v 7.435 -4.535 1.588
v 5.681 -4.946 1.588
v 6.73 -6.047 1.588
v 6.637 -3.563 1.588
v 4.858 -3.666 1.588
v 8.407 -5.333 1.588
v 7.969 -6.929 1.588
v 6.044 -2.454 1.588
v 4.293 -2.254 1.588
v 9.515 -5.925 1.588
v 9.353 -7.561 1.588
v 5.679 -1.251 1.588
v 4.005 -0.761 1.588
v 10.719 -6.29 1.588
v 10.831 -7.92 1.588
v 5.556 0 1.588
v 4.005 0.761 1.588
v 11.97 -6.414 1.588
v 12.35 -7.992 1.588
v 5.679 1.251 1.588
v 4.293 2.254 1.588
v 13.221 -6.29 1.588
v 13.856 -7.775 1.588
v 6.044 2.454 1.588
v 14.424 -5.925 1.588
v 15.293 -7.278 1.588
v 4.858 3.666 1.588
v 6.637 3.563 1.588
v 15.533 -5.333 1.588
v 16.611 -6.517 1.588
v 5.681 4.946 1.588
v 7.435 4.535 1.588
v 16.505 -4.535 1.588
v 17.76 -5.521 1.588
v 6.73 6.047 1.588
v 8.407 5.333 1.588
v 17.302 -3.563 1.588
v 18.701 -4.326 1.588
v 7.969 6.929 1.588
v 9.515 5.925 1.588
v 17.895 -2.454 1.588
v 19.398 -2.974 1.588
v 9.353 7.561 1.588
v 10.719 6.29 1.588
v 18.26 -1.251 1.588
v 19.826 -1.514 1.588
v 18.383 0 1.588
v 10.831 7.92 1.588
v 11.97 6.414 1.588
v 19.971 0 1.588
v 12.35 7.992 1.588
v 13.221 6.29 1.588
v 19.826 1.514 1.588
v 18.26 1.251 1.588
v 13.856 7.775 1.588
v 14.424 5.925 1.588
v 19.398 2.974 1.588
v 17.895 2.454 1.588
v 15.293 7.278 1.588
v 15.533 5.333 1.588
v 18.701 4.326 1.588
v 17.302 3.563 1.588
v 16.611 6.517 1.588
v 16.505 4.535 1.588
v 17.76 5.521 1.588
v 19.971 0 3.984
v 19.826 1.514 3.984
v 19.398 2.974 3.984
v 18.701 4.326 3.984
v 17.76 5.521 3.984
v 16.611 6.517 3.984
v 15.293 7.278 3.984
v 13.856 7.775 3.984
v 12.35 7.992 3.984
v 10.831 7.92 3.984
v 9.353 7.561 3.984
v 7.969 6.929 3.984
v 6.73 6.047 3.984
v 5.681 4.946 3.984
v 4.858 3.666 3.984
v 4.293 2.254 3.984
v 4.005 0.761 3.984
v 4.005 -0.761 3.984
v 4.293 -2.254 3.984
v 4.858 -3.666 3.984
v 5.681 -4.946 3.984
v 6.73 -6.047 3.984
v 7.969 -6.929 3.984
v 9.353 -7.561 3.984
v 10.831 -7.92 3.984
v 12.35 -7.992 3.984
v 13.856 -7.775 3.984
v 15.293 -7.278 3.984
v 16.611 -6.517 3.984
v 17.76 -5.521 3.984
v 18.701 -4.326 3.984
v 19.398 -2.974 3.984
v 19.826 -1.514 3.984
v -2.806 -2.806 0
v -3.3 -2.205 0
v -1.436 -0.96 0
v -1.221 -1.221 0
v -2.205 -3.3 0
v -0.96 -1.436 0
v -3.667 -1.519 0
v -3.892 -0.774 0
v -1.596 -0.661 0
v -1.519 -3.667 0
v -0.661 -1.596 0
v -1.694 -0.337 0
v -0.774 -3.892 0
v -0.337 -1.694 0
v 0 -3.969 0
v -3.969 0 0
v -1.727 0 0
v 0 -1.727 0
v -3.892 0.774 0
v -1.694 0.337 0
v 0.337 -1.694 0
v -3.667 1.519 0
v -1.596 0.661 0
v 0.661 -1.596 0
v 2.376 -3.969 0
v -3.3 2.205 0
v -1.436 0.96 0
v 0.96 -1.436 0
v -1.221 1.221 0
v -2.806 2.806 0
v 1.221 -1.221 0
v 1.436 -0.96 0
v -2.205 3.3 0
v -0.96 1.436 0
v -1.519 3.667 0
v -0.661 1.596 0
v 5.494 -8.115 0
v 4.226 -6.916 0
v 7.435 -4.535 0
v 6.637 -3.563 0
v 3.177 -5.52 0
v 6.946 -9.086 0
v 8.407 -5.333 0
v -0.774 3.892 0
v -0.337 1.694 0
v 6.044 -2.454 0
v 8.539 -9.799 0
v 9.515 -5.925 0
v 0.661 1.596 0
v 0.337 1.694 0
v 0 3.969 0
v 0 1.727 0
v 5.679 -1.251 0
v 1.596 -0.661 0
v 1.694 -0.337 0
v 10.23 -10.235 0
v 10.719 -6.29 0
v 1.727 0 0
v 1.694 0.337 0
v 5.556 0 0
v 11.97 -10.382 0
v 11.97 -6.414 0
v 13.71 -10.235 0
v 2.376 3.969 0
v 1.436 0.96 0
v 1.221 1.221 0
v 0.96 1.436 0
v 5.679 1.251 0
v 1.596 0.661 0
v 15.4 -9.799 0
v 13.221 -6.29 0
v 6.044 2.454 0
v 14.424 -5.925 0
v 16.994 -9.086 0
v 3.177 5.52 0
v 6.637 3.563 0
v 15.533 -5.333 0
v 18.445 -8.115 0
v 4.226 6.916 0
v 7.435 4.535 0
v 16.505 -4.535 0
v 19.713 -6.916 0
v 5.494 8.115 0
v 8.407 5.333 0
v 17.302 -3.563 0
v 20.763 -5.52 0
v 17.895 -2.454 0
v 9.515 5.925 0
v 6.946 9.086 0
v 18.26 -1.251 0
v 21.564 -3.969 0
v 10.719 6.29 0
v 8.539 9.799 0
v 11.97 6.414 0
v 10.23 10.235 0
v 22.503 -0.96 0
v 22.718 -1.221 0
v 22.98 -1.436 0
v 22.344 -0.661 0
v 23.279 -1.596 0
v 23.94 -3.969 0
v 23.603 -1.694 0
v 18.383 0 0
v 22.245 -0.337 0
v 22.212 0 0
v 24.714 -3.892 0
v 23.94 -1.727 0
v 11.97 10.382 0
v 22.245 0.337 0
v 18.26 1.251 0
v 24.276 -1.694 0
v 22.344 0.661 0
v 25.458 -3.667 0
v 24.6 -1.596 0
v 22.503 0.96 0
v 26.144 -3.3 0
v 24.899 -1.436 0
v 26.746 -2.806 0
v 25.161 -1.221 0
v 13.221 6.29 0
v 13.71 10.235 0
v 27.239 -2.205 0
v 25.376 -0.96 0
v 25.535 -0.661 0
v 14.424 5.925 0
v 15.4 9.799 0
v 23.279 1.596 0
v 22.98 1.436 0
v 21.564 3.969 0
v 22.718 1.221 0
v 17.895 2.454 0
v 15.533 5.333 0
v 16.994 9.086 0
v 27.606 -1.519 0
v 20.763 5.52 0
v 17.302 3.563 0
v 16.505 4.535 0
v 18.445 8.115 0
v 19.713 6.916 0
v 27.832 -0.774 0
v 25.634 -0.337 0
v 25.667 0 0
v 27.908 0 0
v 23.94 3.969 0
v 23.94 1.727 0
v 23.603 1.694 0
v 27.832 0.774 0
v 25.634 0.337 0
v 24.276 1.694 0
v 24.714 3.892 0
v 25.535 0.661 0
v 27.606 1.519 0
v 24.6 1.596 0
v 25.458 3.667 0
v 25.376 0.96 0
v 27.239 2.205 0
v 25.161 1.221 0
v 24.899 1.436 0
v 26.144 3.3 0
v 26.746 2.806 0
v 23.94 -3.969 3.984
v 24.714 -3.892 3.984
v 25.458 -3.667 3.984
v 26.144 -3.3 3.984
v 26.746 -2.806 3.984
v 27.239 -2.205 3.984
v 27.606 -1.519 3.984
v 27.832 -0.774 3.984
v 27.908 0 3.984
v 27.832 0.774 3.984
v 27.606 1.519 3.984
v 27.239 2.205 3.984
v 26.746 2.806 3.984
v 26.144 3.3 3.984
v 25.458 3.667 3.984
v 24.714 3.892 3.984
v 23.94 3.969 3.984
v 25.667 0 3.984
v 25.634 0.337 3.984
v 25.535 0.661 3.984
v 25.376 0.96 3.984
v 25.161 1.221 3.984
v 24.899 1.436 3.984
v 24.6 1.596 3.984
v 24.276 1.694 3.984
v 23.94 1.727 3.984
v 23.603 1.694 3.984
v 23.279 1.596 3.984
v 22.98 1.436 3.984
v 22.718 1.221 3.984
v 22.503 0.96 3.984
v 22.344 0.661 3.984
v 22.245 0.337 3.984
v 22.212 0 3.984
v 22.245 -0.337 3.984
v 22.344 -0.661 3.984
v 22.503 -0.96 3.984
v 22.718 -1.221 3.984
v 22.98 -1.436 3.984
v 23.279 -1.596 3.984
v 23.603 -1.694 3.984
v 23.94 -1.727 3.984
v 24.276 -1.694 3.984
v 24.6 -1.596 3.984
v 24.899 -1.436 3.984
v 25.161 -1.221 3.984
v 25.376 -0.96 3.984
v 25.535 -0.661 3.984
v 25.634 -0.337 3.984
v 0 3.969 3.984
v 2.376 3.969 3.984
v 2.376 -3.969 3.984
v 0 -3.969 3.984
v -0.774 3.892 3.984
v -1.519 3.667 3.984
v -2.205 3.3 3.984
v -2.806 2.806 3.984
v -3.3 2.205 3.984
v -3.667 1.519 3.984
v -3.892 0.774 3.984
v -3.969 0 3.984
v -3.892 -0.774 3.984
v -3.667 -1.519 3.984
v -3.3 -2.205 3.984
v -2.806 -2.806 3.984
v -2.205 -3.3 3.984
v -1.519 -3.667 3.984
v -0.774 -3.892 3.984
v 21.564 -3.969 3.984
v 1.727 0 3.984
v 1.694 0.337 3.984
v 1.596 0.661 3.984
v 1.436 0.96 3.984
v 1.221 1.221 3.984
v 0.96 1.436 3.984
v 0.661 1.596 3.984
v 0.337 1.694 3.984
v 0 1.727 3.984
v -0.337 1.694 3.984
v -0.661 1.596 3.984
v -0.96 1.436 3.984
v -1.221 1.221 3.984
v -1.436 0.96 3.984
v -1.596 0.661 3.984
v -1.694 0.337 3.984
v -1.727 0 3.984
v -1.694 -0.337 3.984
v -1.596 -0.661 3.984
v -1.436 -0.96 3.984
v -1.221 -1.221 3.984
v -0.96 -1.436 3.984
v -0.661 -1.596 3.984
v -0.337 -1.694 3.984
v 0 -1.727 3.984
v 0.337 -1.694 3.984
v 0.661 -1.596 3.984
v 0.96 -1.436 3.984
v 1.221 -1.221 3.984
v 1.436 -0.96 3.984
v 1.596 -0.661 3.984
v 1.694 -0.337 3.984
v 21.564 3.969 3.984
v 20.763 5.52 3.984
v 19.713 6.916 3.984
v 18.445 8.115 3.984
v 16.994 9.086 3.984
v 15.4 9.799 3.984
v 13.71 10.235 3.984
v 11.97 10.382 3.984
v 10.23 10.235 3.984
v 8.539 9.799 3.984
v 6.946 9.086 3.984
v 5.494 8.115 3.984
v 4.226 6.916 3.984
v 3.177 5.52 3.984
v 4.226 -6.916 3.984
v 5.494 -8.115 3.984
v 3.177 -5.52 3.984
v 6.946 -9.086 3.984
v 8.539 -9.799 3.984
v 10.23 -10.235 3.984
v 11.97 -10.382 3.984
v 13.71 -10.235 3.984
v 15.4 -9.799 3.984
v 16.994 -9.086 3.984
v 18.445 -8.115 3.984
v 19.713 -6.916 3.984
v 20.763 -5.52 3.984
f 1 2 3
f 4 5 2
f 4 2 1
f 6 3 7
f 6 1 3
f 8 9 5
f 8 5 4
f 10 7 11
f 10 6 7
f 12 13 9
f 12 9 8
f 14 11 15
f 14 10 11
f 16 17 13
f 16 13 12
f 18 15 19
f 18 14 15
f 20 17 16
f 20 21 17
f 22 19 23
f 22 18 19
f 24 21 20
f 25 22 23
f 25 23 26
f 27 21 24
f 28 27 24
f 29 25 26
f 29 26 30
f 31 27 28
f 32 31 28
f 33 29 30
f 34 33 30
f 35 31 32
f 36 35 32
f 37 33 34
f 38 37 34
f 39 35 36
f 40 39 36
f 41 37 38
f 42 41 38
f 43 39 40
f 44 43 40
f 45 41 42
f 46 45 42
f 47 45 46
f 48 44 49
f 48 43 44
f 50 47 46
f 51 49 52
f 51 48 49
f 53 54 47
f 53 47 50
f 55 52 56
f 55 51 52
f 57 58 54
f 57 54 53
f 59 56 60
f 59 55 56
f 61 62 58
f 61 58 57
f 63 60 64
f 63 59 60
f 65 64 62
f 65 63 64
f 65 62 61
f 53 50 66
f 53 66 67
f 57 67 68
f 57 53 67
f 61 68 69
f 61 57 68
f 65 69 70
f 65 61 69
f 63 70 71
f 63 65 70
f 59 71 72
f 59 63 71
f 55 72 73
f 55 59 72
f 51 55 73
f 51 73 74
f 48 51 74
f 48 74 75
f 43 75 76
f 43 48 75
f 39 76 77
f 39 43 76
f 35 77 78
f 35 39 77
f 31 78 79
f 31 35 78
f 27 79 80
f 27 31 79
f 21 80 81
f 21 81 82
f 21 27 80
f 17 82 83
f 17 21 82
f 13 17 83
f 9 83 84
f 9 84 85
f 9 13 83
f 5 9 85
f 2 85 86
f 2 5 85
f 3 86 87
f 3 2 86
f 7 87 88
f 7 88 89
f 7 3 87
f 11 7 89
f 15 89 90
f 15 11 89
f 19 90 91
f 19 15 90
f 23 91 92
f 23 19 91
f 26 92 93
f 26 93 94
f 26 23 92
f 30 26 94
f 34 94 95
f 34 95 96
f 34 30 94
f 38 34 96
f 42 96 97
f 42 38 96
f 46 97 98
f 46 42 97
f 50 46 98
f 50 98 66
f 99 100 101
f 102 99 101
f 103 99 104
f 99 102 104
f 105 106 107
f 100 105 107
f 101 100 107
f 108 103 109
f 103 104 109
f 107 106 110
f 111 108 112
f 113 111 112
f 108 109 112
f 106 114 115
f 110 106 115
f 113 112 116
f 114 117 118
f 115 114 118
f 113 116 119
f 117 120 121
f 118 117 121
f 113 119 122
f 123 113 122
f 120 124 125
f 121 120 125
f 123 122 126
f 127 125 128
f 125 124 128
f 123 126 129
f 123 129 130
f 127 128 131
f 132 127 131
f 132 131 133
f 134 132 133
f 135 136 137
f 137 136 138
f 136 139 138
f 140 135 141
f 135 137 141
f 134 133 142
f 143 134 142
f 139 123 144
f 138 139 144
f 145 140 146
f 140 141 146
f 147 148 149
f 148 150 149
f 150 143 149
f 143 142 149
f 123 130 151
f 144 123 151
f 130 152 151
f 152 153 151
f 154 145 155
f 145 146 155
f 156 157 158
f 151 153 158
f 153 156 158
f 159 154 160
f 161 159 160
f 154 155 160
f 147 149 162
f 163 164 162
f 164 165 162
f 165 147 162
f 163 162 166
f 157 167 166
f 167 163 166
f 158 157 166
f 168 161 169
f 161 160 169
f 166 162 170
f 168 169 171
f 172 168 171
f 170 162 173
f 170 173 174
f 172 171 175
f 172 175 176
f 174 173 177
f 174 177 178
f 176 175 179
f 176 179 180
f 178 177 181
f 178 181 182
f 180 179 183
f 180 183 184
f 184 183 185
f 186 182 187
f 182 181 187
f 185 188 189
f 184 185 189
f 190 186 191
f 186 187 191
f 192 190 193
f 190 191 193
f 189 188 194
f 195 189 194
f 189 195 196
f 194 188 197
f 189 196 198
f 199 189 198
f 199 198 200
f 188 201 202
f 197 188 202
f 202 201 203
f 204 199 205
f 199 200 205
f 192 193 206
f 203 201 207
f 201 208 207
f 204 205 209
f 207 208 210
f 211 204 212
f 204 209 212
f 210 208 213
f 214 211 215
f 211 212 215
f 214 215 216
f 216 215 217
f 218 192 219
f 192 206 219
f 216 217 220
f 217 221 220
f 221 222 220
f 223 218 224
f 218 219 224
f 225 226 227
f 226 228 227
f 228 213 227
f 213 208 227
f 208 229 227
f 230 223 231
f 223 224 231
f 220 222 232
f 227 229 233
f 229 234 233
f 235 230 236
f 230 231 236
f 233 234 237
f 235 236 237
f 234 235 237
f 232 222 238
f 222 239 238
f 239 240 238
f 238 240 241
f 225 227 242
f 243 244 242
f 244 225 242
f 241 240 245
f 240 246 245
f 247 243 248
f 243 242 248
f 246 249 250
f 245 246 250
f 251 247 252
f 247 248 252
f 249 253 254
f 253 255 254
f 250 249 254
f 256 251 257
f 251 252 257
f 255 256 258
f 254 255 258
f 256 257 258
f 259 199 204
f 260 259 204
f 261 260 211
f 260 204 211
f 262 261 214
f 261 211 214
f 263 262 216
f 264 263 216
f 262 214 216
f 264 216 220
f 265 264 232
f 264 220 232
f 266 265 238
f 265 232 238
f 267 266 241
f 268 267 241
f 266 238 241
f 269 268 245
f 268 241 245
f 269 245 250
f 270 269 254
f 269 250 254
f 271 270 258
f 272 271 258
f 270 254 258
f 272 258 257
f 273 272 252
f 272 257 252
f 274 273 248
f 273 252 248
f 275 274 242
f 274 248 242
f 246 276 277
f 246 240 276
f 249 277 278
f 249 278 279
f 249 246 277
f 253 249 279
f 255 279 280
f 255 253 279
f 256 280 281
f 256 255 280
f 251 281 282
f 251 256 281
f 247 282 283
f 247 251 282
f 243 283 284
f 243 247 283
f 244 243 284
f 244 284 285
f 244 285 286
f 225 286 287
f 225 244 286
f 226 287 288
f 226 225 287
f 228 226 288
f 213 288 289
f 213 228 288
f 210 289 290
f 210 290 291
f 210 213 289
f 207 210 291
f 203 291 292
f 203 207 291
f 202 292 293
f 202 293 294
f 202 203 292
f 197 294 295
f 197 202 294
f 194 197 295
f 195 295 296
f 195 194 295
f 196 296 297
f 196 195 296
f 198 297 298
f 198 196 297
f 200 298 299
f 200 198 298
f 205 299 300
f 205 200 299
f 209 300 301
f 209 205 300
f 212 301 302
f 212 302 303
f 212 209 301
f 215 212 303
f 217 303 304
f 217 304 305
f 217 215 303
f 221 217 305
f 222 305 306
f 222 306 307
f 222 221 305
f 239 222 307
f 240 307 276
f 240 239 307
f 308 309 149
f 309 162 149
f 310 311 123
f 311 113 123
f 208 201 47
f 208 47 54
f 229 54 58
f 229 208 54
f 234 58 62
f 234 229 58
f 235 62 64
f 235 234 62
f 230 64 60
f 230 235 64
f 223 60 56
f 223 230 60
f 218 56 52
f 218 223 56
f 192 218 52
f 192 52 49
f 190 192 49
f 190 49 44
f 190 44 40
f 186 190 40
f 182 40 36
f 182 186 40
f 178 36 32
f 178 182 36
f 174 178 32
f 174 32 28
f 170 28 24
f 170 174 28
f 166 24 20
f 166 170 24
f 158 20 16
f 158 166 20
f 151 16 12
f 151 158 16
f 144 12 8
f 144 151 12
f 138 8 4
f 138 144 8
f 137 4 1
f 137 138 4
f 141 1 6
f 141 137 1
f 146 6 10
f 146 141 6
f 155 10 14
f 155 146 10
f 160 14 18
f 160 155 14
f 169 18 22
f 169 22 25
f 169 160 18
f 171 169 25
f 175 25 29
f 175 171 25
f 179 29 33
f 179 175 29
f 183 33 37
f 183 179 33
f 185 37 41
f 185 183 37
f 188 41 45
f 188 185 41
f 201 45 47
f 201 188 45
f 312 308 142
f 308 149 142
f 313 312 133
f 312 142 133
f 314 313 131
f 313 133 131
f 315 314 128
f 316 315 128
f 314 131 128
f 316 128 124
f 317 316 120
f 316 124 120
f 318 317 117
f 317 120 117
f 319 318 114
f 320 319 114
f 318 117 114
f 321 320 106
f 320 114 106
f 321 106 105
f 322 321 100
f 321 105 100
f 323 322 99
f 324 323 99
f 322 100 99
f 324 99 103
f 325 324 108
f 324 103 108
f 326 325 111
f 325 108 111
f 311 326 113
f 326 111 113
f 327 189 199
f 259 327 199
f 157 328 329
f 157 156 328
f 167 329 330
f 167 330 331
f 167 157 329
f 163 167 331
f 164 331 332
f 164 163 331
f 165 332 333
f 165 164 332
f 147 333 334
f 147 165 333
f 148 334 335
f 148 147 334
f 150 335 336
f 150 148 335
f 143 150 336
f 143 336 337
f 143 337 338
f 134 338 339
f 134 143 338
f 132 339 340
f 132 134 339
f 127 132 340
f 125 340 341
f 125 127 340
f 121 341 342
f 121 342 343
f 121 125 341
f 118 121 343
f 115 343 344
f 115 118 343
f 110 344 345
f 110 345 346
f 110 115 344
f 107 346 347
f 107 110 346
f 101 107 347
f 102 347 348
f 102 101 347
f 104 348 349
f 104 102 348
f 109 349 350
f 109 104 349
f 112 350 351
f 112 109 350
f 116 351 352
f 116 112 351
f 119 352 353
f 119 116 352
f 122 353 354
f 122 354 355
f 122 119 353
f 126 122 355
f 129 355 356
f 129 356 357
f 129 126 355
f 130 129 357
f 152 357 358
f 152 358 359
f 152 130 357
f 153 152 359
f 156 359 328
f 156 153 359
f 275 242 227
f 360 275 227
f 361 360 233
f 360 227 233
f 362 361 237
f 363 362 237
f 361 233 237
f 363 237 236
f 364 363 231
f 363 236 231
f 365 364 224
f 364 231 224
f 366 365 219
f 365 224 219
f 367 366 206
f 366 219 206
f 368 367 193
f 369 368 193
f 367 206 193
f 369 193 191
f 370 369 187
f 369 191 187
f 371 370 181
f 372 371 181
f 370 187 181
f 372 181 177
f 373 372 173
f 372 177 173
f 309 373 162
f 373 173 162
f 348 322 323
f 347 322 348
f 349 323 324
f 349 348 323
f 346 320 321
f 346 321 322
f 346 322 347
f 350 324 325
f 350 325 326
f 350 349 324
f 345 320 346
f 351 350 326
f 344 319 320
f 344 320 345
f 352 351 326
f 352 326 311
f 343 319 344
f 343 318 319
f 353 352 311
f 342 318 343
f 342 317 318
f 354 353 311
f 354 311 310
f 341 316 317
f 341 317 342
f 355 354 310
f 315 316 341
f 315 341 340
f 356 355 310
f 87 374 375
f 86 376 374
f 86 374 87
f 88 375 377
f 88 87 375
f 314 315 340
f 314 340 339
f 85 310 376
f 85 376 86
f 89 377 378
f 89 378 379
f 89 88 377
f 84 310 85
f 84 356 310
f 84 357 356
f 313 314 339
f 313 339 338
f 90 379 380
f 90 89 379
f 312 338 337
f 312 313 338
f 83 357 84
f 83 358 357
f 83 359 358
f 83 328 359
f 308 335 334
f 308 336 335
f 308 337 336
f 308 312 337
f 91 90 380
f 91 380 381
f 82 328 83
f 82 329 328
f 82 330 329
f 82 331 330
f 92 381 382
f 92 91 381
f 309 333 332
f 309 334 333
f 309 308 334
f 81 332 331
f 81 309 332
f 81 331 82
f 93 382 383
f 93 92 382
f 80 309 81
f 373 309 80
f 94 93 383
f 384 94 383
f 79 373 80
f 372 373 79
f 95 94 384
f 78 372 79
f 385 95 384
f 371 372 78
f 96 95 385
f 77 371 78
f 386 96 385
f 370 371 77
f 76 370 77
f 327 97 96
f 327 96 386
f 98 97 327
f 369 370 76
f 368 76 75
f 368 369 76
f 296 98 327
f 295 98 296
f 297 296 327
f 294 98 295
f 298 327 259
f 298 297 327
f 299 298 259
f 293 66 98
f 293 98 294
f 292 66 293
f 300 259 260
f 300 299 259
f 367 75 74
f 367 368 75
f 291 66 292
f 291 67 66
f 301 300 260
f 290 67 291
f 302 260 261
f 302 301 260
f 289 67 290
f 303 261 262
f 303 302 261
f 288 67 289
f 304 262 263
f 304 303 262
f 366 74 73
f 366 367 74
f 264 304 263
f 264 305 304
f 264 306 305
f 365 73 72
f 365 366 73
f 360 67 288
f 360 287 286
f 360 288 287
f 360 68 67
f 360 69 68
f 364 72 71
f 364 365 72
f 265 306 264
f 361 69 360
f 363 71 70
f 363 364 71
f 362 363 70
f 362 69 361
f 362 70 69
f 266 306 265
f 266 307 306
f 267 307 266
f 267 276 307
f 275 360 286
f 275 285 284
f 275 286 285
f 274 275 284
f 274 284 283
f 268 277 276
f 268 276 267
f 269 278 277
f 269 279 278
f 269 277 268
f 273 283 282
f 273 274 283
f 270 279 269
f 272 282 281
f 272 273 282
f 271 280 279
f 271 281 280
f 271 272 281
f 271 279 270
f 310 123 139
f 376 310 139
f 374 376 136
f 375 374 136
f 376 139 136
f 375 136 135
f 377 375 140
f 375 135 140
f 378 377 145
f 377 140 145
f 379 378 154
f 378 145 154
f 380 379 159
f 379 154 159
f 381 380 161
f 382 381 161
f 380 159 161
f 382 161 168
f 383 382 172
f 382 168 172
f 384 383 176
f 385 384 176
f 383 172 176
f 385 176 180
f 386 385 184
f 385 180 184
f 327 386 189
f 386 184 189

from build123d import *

# Parameters (mm, degrees)
F0_R     = 1.7272
F0_R_2   = 6.4135
F1_DEPTH = 1.5875
F2_R     = 1.7272
F2_R_2   = 8.001
F3_DEPTH = 2.396515


with BuildPart() as f1:
    # F0 (on Top) → F1 (new body)
    with BuildSketch(Plane.XY):
        with BuildLine():
            Line((2.375995, 3.96875), (0, 3.96875))
            ThreePointArc((0, 3.96875), (-3.96875, 0), (0, -3.96875))
            Line((0, -3.96875), (2.375995, -3.96875))
            ThreePointArc((2.375995, -3.96875), (11.96975, -10.38225), (21.563505, -3.96875))
            Line((21.563505, -3.96875), (23.9395, -3.96875))
            ThreePointArc((23.9395, -3.96875), (27.90825, 0), (23.9395, 3.96875))
            Line((23.9395, 3.96875), (21.563505, 3.96875))
            ThreePointArc((21.563505, 3.96875), (11.96975, 10.38225), (2.375995, 3.96875))
        make_face()
        Circle(F0_R, mode=Mode.SUBTRACT)
        with Locations((11.96975, 0)):
            Circle(F0_R_2, mode=Mode.SUBTRACT)
        with Locations((23.9395, 0)):
            Circle(F0_R, mode=Mode.SUBTRACT)
    extrude(amount=F1_DEPTH)

    # F2 (on face) → F3 (join)
    with BuildSketch(Plane.XY.offset(1.5875)):
        with BuildLine():
            Line((23.9395, 3.96875), (21.563505, 3.96875))
            ThreePointArc((21.563505, 3.96875), (11.96975, 10.38225), (2.375995, 3.96875))
            Line((2.375995, 3.96875), (0, 3.96875))
            ThreePointArc((0, 3.96875), (-3.96875, 0), (0, -3.96875))
            Line((0, -3.96875), (2.375995, -3.96875))
            ThreePointArc((2.375995, -3.96875), (11.96975, -10.38225), (21.563505, -3.96875))
            Line((21.563505, -3.96875), (23.9395, -3.96875))
            ThreePointArc((23.9395, -3.96875), (27.90825, 0), (23.9395, 3.96875))
        make_face()
        Circle(F2_R, mode=Mode.SUBTRACT)
        with Locations((11.96975, 0)):
            Circle(F2_R_2, mode=Mode.SUBTRACT)
        with Locations((23.9395, 0)):
            Circle(F2_R, mode=Mode.SUBTRACT)
    extrude(amount=F3_DEPTH)


solid = f1.part
